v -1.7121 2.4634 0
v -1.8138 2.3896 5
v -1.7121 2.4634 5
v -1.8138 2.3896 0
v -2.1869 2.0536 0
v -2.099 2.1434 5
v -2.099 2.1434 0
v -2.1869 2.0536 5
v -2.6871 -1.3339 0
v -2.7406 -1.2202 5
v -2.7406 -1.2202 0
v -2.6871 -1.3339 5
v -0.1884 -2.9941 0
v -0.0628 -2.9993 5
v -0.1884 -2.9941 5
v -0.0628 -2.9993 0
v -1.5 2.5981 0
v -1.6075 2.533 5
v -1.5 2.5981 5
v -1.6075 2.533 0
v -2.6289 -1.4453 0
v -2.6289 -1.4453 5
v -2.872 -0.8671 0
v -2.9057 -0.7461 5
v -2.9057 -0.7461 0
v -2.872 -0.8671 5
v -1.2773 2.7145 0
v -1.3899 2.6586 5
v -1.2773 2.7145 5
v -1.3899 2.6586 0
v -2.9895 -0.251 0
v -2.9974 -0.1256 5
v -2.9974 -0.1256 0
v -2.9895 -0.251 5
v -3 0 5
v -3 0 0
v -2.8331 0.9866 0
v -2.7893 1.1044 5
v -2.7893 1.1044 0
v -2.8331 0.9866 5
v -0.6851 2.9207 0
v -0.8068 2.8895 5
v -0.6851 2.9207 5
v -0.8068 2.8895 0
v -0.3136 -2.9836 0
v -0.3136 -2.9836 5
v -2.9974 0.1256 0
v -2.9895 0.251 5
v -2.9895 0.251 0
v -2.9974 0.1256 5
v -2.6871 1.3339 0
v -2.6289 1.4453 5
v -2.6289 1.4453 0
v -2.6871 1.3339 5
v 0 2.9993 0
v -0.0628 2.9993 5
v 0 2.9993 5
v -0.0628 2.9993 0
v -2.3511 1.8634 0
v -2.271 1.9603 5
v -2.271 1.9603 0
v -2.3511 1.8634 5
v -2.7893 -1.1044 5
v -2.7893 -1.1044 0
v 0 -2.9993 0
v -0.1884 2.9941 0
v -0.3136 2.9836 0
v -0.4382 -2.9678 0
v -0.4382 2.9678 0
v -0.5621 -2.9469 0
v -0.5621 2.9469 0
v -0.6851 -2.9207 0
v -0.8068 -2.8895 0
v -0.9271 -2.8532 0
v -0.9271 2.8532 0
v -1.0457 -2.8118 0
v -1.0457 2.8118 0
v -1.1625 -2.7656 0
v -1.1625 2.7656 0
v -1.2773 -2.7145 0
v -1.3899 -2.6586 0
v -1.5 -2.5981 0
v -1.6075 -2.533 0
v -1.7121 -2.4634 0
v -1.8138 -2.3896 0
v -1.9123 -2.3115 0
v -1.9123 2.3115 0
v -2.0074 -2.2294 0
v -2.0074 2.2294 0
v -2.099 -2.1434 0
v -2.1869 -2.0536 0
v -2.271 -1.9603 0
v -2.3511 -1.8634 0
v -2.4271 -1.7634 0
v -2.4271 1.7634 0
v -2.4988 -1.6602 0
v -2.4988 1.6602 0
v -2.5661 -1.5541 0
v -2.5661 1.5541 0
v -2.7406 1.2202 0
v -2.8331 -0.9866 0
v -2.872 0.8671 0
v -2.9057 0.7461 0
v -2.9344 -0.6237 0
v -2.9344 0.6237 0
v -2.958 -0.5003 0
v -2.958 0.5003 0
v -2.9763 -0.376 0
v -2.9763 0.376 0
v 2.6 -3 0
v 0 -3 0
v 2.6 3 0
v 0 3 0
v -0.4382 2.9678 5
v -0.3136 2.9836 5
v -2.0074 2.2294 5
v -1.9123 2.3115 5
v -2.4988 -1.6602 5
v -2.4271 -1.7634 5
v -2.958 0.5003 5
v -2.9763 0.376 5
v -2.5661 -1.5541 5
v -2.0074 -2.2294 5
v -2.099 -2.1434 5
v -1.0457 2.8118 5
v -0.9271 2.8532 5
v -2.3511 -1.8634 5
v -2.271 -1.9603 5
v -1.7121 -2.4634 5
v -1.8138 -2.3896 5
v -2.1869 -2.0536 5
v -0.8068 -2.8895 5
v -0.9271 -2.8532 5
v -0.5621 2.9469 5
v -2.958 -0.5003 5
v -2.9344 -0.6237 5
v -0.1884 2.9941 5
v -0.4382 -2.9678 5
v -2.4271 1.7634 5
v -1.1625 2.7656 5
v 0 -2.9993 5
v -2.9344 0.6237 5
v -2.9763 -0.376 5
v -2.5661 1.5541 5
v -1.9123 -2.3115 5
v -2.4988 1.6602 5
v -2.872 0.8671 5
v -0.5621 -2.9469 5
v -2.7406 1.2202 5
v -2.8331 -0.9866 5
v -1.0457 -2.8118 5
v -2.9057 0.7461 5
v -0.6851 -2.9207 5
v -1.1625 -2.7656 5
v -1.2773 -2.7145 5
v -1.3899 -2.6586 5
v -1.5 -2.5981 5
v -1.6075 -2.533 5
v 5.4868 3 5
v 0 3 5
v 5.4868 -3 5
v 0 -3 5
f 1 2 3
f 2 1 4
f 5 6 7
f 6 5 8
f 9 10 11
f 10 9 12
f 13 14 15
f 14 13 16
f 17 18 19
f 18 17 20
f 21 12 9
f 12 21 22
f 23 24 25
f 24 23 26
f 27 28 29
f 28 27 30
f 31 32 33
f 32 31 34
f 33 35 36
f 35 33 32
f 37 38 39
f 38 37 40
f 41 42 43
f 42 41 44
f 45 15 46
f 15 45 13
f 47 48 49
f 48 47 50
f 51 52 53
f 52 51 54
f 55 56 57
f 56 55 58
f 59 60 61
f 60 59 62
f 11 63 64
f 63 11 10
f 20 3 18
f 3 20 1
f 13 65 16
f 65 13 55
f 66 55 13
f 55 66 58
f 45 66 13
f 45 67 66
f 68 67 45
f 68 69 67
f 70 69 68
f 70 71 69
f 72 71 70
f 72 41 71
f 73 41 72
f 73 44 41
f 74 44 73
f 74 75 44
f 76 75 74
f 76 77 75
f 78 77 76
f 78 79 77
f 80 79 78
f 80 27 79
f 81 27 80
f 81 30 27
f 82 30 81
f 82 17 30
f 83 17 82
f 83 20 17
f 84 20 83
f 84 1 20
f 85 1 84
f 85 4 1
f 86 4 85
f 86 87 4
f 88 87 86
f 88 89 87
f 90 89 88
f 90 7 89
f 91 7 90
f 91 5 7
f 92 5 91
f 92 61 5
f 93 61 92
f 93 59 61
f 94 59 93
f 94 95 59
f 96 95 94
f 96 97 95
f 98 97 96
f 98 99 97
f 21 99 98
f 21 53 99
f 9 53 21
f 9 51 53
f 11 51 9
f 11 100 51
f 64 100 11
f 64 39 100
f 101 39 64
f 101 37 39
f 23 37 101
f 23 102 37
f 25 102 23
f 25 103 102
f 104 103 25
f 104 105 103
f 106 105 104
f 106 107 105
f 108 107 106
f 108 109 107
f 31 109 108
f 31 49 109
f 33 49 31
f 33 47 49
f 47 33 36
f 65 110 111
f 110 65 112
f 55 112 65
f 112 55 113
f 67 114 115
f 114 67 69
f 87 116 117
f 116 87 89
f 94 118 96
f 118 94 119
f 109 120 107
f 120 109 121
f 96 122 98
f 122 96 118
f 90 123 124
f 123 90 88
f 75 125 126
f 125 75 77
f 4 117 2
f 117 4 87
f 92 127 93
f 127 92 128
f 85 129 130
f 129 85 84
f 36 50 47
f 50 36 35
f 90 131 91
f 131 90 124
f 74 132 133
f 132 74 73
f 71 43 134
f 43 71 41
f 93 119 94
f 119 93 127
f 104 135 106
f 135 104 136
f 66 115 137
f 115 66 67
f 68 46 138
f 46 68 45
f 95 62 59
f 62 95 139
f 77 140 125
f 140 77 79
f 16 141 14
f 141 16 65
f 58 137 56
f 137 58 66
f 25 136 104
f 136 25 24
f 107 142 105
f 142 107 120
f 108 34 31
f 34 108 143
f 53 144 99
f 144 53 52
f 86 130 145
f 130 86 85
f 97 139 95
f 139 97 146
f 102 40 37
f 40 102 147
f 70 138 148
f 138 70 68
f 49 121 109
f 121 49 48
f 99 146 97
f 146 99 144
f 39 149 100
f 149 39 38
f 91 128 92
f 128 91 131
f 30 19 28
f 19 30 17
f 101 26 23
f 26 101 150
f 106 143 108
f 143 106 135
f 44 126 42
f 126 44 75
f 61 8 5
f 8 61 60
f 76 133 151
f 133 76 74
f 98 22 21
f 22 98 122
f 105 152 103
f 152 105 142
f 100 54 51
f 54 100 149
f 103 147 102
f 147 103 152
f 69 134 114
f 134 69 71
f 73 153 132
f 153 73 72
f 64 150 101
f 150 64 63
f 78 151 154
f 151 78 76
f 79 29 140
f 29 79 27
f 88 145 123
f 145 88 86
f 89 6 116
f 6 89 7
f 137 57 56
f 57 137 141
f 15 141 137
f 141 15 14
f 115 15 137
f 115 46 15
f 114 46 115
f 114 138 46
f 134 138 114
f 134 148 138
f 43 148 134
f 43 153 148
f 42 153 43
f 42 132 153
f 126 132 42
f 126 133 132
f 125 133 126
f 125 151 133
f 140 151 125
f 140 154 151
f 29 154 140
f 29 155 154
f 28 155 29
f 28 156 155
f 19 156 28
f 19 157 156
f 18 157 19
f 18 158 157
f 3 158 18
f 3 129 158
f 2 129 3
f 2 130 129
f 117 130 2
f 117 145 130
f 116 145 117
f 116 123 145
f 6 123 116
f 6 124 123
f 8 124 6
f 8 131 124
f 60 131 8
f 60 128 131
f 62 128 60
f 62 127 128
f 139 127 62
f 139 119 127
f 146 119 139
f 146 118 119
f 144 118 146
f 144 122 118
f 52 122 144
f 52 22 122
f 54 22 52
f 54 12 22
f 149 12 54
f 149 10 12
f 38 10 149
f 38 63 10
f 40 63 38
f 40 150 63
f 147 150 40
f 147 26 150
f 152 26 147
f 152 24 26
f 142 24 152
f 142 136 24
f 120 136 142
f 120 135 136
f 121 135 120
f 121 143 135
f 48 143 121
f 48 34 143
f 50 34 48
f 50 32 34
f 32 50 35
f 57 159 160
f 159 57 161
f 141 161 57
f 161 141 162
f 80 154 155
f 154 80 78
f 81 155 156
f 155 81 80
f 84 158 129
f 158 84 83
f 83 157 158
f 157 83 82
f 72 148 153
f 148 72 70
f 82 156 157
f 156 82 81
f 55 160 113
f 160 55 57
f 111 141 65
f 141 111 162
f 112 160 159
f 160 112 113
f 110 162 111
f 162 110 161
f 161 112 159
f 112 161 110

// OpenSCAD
$fn=150;


difference()
{
	union()
	{
		cylinder(h=5,d=6);
		translate([0,-3,0]) cube([5.5,6,5]);
	}
	// maybe set the rotation to 20 or 25 degrees and reduce the total length
	translate([2.6,-4,0]) rotate([0,30,0])cube(8);
}
